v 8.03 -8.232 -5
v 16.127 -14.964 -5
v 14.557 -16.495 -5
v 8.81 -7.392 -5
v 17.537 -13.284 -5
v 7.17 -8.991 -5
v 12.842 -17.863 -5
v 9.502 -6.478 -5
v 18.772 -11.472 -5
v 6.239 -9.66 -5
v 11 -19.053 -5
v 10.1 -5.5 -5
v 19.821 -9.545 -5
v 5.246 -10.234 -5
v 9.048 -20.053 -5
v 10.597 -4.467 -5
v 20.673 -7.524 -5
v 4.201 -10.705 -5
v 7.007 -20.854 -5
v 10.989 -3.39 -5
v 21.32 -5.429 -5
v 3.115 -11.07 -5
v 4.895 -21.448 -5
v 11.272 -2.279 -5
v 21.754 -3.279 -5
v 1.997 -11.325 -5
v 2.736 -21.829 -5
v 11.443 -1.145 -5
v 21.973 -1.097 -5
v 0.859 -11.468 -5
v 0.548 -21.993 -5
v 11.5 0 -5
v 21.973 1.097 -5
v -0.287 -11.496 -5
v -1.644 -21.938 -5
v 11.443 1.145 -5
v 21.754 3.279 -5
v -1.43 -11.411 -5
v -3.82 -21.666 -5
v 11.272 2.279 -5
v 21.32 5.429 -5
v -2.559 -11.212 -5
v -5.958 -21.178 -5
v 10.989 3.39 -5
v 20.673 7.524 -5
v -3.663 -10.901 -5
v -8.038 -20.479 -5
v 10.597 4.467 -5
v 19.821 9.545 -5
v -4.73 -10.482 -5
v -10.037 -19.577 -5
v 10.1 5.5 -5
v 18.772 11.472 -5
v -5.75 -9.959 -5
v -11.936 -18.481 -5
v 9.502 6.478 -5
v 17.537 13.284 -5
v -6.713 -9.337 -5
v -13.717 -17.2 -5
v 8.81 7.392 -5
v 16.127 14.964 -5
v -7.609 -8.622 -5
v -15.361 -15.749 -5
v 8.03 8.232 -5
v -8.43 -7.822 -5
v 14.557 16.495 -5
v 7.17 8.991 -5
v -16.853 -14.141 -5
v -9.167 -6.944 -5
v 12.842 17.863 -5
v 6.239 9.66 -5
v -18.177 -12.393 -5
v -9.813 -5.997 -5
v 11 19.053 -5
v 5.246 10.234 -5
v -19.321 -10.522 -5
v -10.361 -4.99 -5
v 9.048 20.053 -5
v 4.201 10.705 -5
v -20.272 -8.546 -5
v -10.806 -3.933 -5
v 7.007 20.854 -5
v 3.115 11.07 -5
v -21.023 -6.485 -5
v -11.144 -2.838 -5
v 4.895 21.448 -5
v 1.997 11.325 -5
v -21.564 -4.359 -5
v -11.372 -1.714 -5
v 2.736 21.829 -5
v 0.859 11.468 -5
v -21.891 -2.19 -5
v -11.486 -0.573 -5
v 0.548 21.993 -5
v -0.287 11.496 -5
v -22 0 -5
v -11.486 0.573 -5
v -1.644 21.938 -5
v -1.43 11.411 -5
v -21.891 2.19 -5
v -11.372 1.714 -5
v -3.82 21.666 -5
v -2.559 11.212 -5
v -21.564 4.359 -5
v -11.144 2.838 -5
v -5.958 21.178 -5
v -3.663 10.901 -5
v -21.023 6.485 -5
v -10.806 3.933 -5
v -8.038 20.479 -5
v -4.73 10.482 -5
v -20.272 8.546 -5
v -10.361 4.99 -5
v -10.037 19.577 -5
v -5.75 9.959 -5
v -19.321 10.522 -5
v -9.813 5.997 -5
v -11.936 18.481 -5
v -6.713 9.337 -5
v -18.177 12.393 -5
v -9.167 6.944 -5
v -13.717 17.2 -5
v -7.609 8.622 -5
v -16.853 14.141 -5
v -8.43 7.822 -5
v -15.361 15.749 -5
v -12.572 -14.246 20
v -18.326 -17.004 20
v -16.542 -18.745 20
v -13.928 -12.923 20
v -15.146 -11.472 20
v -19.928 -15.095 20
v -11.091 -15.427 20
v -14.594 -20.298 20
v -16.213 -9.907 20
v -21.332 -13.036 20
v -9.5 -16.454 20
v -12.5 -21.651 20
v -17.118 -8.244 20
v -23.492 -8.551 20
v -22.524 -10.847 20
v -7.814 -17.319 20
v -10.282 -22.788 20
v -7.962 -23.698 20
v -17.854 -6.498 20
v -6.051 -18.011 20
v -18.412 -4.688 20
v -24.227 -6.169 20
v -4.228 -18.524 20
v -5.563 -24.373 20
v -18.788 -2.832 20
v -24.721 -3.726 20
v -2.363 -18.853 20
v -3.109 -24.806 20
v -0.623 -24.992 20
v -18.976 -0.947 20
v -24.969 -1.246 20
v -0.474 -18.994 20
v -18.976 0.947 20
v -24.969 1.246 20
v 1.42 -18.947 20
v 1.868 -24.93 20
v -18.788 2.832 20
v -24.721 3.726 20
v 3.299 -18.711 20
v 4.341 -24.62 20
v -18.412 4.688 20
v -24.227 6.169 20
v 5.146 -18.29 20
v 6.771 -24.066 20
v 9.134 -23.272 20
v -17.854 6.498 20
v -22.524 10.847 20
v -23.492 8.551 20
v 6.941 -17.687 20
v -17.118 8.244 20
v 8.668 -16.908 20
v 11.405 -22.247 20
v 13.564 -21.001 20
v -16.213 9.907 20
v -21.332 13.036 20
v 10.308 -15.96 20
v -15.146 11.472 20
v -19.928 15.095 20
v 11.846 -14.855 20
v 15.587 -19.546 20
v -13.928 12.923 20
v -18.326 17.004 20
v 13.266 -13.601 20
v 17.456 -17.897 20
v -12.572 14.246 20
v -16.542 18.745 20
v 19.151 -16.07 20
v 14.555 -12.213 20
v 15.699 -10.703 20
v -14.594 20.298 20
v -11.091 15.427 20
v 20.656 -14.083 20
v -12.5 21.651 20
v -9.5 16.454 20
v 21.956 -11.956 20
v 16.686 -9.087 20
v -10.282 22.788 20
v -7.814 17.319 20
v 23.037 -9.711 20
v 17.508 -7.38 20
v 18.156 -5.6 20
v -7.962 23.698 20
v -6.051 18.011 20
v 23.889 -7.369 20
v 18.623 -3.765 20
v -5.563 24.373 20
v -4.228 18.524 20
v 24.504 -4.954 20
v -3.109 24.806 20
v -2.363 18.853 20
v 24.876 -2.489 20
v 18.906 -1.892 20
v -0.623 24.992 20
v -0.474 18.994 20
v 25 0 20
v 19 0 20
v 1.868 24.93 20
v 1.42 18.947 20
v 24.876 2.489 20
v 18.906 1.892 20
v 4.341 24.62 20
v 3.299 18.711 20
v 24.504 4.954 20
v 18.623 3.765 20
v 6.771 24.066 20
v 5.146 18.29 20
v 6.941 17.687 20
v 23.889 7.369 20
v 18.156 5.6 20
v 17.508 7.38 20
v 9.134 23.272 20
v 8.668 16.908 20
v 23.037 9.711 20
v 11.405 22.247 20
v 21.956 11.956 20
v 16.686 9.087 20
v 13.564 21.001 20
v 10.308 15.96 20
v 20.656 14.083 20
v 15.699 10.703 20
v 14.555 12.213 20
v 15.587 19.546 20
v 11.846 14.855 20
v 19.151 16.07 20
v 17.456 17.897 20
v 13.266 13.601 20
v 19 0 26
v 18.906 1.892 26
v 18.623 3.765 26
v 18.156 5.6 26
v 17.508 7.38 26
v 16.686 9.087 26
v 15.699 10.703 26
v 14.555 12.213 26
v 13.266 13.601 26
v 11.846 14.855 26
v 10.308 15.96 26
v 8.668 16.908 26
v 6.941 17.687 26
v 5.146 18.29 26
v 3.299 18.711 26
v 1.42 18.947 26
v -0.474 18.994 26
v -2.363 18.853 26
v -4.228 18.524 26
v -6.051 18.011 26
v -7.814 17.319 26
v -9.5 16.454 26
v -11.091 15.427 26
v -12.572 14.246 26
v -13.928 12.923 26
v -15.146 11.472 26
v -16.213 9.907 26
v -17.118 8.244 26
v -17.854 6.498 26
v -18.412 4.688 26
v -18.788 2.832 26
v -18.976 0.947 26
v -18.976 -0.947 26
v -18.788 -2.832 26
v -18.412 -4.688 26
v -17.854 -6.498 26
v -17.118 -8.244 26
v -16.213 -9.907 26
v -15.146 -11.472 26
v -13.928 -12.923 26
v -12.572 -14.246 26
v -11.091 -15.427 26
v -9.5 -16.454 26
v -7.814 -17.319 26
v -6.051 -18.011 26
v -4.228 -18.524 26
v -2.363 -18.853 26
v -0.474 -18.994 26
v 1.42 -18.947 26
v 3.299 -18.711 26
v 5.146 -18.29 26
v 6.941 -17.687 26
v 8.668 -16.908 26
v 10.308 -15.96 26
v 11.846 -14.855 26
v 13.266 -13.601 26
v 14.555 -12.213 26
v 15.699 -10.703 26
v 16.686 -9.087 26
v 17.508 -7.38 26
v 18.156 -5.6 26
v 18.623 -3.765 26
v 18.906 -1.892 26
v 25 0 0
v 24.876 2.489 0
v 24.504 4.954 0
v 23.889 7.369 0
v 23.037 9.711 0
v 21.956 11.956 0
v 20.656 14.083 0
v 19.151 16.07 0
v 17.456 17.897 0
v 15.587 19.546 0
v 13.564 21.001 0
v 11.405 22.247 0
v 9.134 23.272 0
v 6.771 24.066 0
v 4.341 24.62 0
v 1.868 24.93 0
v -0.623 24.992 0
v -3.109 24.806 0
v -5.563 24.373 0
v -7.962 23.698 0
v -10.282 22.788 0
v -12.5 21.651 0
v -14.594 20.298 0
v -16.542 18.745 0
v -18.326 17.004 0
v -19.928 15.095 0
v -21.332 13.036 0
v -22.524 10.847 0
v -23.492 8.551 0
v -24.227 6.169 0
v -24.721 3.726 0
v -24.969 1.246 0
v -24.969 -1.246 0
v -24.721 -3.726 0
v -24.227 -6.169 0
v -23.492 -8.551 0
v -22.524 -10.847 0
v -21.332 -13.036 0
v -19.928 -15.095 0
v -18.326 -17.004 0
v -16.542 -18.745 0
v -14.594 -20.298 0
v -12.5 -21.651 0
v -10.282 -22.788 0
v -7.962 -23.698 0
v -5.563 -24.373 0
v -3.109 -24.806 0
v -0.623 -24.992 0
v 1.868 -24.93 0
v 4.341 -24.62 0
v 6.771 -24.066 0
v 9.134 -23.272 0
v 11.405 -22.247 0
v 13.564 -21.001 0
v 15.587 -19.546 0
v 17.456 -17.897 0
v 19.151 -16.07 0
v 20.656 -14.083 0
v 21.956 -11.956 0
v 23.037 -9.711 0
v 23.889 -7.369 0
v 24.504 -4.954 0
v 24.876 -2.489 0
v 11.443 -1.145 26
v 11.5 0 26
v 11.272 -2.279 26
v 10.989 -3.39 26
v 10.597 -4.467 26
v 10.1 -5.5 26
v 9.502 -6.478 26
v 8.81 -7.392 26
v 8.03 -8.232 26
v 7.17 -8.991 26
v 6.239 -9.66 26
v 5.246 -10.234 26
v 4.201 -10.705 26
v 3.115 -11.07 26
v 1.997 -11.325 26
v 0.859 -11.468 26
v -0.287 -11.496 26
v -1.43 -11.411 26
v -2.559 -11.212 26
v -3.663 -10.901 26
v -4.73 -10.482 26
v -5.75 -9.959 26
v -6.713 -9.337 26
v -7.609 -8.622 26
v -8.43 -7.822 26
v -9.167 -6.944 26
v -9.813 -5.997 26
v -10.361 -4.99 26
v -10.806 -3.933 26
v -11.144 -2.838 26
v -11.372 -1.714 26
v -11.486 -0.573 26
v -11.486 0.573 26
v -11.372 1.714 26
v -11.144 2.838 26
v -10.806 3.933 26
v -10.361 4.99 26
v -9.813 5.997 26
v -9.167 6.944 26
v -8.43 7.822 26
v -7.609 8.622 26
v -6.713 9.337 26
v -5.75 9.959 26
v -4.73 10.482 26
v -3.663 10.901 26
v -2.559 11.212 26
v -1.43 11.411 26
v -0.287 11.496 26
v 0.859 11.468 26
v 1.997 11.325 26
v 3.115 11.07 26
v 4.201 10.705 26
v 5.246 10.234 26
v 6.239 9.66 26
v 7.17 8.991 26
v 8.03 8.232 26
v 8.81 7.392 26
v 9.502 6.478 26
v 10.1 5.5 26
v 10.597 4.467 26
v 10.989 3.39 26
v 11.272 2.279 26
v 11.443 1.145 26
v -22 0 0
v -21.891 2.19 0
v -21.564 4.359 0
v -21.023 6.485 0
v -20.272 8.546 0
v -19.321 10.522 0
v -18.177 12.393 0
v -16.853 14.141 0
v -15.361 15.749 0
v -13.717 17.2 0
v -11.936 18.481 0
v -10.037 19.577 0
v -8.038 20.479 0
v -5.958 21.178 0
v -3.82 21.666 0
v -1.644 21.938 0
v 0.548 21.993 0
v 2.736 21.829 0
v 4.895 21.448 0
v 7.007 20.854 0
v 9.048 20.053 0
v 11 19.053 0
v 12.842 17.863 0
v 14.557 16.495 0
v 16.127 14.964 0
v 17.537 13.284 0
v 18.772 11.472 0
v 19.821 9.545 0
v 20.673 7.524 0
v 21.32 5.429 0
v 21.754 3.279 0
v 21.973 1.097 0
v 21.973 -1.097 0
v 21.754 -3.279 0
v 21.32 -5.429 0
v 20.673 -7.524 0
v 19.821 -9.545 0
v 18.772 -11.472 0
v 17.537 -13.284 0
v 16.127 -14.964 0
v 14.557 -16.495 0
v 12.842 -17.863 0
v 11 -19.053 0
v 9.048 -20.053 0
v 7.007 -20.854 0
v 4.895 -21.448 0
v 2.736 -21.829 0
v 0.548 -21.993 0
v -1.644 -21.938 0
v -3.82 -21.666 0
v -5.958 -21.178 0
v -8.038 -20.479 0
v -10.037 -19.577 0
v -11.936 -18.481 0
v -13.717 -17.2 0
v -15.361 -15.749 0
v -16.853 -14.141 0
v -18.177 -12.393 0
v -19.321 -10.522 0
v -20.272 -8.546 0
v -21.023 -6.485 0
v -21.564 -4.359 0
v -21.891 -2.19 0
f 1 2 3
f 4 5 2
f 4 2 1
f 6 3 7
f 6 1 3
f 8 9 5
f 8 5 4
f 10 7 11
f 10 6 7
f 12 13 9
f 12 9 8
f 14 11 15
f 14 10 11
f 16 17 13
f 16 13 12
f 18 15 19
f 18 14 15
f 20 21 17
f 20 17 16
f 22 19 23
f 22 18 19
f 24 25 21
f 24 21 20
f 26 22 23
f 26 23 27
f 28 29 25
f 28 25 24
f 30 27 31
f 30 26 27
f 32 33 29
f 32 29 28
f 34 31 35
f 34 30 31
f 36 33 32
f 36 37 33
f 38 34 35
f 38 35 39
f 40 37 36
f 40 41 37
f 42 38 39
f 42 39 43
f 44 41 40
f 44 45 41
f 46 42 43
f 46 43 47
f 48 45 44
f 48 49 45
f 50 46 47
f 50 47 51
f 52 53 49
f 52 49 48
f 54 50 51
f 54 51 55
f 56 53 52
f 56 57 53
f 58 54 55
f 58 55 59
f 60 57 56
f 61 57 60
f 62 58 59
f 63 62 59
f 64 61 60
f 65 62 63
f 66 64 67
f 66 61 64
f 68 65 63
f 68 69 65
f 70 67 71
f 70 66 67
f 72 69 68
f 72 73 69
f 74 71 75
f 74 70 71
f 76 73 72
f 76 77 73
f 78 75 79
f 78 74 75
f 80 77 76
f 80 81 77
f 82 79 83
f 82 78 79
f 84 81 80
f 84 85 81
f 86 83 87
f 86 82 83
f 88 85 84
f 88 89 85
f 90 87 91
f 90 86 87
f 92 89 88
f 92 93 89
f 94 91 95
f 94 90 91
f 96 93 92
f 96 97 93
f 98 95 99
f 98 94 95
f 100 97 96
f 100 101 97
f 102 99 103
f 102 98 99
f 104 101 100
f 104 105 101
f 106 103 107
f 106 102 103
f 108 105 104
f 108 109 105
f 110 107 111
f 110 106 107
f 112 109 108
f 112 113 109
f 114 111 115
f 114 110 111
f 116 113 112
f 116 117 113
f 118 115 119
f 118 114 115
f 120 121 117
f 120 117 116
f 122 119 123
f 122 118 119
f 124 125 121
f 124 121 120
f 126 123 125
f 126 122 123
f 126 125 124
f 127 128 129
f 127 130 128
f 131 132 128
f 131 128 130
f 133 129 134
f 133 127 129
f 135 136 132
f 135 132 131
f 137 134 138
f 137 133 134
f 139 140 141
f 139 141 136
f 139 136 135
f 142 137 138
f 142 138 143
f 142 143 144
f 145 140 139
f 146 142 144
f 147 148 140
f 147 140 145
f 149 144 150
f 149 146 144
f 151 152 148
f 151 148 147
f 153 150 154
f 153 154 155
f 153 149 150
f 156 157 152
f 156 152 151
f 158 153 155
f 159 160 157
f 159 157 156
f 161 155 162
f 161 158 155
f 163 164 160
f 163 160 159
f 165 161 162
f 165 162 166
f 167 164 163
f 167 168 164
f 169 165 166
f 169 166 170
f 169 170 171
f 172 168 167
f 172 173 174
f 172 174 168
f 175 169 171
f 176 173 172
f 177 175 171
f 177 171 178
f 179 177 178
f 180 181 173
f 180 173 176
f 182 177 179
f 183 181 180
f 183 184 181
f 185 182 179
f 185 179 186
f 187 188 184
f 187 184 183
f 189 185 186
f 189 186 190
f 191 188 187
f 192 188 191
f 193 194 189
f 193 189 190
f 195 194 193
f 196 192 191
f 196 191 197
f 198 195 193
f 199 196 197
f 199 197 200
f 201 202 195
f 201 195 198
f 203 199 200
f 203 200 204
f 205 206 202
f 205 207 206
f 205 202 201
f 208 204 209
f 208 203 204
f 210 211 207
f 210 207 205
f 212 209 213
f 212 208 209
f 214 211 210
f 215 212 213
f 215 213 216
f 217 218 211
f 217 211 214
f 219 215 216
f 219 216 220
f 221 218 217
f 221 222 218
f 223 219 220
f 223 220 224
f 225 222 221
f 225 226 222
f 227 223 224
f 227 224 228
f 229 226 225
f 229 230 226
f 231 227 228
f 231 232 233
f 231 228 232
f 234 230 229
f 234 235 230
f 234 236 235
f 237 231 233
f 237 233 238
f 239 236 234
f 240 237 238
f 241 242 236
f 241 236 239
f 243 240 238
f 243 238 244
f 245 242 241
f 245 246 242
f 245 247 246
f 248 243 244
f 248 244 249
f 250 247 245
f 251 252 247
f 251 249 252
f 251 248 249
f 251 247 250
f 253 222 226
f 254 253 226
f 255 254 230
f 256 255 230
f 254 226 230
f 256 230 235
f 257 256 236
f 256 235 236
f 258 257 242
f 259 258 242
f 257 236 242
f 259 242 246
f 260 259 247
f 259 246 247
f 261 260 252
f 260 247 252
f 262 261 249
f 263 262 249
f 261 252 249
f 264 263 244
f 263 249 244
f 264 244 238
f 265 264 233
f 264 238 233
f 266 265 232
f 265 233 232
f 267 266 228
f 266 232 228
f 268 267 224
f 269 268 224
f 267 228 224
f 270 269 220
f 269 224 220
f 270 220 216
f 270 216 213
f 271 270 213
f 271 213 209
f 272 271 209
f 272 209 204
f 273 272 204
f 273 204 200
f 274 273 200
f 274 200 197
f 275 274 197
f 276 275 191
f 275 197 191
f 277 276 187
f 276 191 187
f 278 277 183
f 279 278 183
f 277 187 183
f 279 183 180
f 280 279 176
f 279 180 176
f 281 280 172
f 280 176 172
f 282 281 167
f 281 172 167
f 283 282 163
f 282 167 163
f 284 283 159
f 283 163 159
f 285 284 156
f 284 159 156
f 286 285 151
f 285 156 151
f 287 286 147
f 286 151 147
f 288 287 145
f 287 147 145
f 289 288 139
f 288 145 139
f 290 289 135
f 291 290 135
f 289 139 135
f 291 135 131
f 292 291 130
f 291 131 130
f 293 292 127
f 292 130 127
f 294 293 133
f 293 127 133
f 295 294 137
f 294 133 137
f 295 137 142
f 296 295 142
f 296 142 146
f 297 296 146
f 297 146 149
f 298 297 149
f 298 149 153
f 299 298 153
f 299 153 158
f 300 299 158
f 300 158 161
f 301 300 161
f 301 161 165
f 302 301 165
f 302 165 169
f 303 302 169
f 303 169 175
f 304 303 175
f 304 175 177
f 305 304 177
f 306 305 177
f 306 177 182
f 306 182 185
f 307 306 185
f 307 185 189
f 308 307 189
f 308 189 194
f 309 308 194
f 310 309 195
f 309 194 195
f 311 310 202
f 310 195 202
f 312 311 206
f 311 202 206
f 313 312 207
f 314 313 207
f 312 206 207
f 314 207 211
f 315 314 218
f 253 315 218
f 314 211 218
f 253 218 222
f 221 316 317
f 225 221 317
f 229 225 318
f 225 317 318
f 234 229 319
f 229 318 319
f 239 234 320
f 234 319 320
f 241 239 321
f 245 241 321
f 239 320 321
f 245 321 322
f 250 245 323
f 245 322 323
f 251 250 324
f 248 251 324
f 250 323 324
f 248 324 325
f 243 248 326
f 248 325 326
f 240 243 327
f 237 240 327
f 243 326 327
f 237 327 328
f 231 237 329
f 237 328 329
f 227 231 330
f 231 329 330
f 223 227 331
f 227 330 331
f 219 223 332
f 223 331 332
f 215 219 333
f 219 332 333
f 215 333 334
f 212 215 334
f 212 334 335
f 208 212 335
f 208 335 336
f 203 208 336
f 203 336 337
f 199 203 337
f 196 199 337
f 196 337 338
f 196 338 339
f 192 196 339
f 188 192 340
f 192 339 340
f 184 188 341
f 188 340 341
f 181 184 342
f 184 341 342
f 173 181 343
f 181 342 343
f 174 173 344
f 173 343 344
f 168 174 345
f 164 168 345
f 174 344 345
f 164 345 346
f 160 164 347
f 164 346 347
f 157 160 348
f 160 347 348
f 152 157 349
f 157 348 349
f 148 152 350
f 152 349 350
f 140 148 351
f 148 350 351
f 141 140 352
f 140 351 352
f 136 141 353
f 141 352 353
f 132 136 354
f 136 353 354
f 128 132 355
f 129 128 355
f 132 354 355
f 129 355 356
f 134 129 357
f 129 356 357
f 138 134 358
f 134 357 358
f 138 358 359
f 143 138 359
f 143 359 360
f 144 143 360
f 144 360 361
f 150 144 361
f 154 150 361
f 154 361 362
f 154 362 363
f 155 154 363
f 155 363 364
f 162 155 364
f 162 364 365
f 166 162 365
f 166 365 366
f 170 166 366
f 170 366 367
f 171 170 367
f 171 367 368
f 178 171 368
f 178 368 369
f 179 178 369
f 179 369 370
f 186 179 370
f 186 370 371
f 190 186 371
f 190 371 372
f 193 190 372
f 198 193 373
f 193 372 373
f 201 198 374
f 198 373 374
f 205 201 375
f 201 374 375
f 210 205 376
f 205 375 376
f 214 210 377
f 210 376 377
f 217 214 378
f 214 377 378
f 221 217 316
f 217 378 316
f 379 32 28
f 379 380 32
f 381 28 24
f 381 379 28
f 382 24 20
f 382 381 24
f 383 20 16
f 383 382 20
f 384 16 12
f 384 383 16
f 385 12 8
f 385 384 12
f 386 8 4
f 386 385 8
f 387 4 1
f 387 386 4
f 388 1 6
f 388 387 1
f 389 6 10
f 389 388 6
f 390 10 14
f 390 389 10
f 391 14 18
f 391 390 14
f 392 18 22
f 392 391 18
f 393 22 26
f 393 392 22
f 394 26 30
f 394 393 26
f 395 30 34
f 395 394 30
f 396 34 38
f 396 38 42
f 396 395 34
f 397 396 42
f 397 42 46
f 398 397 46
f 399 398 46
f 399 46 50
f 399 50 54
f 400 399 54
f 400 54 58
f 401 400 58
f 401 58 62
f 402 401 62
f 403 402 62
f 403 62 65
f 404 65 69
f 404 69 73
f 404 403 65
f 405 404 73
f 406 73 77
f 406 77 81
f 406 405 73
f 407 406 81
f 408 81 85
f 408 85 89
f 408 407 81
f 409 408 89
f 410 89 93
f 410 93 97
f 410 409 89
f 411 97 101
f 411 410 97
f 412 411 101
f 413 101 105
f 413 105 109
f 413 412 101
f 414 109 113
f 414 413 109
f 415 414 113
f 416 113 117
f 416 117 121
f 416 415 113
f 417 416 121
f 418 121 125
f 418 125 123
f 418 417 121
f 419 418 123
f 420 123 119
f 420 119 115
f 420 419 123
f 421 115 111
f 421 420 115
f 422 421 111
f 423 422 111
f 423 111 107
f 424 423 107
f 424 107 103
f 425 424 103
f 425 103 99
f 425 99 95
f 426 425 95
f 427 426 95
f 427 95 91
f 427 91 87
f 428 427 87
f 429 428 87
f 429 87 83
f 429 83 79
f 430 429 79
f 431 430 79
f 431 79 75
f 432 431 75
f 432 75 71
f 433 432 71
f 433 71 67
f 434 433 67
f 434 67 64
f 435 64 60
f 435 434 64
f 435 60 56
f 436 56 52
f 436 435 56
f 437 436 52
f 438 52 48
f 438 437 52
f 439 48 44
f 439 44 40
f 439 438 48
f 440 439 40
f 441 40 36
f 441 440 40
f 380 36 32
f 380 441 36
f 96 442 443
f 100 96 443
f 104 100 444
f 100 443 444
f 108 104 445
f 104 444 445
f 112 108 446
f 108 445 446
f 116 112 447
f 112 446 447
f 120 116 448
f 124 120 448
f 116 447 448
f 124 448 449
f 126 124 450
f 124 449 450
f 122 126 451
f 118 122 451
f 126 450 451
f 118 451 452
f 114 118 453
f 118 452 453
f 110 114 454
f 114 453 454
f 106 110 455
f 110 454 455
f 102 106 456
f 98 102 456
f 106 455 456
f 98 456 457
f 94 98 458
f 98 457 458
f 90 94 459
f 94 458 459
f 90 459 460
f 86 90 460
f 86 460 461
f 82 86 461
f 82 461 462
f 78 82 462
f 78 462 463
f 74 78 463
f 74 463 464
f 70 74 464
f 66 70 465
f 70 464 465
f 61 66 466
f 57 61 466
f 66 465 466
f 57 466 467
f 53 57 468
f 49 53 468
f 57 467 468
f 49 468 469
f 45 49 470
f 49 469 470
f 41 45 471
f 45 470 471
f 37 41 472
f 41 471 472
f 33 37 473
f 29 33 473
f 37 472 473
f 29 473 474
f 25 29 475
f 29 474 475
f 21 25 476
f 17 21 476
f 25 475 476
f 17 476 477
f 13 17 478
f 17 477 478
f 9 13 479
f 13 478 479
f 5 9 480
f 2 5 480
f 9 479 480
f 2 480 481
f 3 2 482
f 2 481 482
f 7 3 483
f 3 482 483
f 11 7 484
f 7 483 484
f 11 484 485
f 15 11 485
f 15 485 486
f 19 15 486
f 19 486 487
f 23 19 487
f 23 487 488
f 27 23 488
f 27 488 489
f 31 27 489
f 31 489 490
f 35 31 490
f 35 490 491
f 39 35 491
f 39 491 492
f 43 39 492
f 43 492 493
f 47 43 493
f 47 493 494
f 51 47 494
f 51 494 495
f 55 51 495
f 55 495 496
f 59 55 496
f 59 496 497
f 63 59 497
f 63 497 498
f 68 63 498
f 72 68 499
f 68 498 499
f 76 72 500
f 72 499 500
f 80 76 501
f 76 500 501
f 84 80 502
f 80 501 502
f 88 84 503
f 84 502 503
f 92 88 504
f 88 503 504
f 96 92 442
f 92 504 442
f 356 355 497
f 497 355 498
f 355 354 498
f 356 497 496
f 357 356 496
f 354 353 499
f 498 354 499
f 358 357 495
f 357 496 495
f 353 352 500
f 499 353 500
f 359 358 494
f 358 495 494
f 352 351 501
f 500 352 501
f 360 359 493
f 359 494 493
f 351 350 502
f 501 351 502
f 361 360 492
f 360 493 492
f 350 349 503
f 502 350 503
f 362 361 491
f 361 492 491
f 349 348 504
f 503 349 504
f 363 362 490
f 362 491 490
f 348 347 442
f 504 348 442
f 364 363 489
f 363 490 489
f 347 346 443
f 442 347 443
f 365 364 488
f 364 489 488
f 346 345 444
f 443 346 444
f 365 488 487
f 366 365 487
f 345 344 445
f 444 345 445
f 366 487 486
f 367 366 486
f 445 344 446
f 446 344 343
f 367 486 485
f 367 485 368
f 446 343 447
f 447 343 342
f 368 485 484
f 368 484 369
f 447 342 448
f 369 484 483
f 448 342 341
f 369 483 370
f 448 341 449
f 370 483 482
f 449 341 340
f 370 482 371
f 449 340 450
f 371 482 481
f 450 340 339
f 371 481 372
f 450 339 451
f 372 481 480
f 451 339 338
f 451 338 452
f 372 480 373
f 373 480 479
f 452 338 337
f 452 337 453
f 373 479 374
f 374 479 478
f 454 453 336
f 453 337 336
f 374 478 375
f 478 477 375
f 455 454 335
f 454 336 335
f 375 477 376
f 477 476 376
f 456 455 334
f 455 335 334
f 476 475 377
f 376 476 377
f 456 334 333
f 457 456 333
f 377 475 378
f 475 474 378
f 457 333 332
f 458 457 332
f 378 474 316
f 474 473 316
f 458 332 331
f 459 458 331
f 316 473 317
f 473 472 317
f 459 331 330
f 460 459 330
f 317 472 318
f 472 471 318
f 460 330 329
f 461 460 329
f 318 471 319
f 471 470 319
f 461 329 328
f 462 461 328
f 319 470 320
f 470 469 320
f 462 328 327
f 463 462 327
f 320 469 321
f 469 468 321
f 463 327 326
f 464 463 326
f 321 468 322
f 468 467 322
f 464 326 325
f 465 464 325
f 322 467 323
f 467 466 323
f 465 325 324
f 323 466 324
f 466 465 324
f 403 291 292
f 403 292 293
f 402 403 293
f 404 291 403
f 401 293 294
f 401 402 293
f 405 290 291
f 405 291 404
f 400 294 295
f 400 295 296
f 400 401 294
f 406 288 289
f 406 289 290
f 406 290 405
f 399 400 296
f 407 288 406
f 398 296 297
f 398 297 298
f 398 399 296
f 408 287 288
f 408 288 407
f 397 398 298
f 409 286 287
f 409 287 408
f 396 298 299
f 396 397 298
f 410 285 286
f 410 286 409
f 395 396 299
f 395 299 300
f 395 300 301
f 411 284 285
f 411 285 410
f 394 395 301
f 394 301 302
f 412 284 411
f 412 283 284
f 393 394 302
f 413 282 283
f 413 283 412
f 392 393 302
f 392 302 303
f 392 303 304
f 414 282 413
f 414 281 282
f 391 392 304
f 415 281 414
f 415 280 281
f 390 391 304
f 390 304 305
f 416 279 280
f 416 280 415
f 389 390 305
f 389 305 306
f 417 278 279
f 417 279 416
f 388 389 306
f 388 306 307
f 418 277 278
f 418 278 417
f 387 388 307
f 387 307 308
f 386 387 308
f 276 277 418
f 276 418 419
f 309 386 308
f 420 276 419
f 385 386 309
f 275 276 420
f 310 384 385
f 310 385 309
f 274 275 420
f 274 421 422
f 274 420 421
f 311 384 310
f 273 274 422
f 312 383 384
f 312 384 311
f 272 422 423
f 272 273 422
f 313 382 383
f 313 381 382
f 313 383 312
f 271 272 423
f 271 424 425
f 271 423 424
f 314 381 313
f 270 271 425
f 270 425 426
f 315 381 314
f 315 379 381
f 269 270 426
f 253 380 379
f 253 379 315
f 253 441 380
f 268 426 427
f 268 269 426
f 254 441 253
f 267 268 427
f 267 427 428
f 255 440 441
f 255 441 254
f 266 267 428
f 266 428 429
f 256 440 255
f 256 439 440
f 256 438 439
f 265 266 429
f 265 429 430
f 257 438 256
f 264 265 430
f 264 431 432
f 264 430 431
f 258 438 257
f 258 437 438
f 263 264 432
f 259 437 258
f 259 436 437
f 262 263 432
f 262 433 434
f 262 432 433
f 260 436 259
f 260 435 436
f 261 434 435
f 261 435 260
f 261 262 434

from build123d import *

# Parameters (mm, degrees)
SKETCH1_R           = 25
BOSS_EXTRUDE1_DEPTH = 20
SKETCH2_R           = 19
BOSS_EXTRUDE2_DEPTH = 6
SKETCH3_R           = 11.5
CUT_EXTRUDE1_DEPTH  = 60
SKETCH5_R           = 22
SKETCH5_R_2         = 11.5
BOSS_EXTRUDE4_DEPTH = 5


with BuildPart() as part:
    # Sketch1 → Boss-Extrude1 (new body)
    with BuildSketch(Plane.XY):
        Circle(SKETCH1_R)
    extrude(amount=BOSS_EXTRUDE1_DEPTH)

    # Sketch2 → Boss-Extrude2 (add)
    with BuildSketch(Plane.XY.offset(20)):
        Circle(SKETCH2_R)
    extrude(amount=BOSS_EXTRUDE2_DEPTH)

    # Sketch3 → Cut-Extrude1 (cut)
    with BuildSketch(Plane.XY.offset(26)):
        Circle(SKETCH3_R)
    extrude(amount=-CUT_EXTRUDE1_DEPTH, mode=Mode.SUBTRACT)

    # Sketch5 → Boss-Extrude4 (add)
    with BuildSketch(Plane(origin=(0, 0, 0), x_dir=(-1, 0, 0), z_dir=(0, 0, -1))):
        Circle(SKETCH5_R)
        with Locations(Location((0, 0, 0), (0, 0, 180))):
            Circle(SKETCH5_R_2, mode=Mode.SUBTRACT)
    extrude(amount=BOSS_EXTRUDE4_DEPTH)


solid = part.part
